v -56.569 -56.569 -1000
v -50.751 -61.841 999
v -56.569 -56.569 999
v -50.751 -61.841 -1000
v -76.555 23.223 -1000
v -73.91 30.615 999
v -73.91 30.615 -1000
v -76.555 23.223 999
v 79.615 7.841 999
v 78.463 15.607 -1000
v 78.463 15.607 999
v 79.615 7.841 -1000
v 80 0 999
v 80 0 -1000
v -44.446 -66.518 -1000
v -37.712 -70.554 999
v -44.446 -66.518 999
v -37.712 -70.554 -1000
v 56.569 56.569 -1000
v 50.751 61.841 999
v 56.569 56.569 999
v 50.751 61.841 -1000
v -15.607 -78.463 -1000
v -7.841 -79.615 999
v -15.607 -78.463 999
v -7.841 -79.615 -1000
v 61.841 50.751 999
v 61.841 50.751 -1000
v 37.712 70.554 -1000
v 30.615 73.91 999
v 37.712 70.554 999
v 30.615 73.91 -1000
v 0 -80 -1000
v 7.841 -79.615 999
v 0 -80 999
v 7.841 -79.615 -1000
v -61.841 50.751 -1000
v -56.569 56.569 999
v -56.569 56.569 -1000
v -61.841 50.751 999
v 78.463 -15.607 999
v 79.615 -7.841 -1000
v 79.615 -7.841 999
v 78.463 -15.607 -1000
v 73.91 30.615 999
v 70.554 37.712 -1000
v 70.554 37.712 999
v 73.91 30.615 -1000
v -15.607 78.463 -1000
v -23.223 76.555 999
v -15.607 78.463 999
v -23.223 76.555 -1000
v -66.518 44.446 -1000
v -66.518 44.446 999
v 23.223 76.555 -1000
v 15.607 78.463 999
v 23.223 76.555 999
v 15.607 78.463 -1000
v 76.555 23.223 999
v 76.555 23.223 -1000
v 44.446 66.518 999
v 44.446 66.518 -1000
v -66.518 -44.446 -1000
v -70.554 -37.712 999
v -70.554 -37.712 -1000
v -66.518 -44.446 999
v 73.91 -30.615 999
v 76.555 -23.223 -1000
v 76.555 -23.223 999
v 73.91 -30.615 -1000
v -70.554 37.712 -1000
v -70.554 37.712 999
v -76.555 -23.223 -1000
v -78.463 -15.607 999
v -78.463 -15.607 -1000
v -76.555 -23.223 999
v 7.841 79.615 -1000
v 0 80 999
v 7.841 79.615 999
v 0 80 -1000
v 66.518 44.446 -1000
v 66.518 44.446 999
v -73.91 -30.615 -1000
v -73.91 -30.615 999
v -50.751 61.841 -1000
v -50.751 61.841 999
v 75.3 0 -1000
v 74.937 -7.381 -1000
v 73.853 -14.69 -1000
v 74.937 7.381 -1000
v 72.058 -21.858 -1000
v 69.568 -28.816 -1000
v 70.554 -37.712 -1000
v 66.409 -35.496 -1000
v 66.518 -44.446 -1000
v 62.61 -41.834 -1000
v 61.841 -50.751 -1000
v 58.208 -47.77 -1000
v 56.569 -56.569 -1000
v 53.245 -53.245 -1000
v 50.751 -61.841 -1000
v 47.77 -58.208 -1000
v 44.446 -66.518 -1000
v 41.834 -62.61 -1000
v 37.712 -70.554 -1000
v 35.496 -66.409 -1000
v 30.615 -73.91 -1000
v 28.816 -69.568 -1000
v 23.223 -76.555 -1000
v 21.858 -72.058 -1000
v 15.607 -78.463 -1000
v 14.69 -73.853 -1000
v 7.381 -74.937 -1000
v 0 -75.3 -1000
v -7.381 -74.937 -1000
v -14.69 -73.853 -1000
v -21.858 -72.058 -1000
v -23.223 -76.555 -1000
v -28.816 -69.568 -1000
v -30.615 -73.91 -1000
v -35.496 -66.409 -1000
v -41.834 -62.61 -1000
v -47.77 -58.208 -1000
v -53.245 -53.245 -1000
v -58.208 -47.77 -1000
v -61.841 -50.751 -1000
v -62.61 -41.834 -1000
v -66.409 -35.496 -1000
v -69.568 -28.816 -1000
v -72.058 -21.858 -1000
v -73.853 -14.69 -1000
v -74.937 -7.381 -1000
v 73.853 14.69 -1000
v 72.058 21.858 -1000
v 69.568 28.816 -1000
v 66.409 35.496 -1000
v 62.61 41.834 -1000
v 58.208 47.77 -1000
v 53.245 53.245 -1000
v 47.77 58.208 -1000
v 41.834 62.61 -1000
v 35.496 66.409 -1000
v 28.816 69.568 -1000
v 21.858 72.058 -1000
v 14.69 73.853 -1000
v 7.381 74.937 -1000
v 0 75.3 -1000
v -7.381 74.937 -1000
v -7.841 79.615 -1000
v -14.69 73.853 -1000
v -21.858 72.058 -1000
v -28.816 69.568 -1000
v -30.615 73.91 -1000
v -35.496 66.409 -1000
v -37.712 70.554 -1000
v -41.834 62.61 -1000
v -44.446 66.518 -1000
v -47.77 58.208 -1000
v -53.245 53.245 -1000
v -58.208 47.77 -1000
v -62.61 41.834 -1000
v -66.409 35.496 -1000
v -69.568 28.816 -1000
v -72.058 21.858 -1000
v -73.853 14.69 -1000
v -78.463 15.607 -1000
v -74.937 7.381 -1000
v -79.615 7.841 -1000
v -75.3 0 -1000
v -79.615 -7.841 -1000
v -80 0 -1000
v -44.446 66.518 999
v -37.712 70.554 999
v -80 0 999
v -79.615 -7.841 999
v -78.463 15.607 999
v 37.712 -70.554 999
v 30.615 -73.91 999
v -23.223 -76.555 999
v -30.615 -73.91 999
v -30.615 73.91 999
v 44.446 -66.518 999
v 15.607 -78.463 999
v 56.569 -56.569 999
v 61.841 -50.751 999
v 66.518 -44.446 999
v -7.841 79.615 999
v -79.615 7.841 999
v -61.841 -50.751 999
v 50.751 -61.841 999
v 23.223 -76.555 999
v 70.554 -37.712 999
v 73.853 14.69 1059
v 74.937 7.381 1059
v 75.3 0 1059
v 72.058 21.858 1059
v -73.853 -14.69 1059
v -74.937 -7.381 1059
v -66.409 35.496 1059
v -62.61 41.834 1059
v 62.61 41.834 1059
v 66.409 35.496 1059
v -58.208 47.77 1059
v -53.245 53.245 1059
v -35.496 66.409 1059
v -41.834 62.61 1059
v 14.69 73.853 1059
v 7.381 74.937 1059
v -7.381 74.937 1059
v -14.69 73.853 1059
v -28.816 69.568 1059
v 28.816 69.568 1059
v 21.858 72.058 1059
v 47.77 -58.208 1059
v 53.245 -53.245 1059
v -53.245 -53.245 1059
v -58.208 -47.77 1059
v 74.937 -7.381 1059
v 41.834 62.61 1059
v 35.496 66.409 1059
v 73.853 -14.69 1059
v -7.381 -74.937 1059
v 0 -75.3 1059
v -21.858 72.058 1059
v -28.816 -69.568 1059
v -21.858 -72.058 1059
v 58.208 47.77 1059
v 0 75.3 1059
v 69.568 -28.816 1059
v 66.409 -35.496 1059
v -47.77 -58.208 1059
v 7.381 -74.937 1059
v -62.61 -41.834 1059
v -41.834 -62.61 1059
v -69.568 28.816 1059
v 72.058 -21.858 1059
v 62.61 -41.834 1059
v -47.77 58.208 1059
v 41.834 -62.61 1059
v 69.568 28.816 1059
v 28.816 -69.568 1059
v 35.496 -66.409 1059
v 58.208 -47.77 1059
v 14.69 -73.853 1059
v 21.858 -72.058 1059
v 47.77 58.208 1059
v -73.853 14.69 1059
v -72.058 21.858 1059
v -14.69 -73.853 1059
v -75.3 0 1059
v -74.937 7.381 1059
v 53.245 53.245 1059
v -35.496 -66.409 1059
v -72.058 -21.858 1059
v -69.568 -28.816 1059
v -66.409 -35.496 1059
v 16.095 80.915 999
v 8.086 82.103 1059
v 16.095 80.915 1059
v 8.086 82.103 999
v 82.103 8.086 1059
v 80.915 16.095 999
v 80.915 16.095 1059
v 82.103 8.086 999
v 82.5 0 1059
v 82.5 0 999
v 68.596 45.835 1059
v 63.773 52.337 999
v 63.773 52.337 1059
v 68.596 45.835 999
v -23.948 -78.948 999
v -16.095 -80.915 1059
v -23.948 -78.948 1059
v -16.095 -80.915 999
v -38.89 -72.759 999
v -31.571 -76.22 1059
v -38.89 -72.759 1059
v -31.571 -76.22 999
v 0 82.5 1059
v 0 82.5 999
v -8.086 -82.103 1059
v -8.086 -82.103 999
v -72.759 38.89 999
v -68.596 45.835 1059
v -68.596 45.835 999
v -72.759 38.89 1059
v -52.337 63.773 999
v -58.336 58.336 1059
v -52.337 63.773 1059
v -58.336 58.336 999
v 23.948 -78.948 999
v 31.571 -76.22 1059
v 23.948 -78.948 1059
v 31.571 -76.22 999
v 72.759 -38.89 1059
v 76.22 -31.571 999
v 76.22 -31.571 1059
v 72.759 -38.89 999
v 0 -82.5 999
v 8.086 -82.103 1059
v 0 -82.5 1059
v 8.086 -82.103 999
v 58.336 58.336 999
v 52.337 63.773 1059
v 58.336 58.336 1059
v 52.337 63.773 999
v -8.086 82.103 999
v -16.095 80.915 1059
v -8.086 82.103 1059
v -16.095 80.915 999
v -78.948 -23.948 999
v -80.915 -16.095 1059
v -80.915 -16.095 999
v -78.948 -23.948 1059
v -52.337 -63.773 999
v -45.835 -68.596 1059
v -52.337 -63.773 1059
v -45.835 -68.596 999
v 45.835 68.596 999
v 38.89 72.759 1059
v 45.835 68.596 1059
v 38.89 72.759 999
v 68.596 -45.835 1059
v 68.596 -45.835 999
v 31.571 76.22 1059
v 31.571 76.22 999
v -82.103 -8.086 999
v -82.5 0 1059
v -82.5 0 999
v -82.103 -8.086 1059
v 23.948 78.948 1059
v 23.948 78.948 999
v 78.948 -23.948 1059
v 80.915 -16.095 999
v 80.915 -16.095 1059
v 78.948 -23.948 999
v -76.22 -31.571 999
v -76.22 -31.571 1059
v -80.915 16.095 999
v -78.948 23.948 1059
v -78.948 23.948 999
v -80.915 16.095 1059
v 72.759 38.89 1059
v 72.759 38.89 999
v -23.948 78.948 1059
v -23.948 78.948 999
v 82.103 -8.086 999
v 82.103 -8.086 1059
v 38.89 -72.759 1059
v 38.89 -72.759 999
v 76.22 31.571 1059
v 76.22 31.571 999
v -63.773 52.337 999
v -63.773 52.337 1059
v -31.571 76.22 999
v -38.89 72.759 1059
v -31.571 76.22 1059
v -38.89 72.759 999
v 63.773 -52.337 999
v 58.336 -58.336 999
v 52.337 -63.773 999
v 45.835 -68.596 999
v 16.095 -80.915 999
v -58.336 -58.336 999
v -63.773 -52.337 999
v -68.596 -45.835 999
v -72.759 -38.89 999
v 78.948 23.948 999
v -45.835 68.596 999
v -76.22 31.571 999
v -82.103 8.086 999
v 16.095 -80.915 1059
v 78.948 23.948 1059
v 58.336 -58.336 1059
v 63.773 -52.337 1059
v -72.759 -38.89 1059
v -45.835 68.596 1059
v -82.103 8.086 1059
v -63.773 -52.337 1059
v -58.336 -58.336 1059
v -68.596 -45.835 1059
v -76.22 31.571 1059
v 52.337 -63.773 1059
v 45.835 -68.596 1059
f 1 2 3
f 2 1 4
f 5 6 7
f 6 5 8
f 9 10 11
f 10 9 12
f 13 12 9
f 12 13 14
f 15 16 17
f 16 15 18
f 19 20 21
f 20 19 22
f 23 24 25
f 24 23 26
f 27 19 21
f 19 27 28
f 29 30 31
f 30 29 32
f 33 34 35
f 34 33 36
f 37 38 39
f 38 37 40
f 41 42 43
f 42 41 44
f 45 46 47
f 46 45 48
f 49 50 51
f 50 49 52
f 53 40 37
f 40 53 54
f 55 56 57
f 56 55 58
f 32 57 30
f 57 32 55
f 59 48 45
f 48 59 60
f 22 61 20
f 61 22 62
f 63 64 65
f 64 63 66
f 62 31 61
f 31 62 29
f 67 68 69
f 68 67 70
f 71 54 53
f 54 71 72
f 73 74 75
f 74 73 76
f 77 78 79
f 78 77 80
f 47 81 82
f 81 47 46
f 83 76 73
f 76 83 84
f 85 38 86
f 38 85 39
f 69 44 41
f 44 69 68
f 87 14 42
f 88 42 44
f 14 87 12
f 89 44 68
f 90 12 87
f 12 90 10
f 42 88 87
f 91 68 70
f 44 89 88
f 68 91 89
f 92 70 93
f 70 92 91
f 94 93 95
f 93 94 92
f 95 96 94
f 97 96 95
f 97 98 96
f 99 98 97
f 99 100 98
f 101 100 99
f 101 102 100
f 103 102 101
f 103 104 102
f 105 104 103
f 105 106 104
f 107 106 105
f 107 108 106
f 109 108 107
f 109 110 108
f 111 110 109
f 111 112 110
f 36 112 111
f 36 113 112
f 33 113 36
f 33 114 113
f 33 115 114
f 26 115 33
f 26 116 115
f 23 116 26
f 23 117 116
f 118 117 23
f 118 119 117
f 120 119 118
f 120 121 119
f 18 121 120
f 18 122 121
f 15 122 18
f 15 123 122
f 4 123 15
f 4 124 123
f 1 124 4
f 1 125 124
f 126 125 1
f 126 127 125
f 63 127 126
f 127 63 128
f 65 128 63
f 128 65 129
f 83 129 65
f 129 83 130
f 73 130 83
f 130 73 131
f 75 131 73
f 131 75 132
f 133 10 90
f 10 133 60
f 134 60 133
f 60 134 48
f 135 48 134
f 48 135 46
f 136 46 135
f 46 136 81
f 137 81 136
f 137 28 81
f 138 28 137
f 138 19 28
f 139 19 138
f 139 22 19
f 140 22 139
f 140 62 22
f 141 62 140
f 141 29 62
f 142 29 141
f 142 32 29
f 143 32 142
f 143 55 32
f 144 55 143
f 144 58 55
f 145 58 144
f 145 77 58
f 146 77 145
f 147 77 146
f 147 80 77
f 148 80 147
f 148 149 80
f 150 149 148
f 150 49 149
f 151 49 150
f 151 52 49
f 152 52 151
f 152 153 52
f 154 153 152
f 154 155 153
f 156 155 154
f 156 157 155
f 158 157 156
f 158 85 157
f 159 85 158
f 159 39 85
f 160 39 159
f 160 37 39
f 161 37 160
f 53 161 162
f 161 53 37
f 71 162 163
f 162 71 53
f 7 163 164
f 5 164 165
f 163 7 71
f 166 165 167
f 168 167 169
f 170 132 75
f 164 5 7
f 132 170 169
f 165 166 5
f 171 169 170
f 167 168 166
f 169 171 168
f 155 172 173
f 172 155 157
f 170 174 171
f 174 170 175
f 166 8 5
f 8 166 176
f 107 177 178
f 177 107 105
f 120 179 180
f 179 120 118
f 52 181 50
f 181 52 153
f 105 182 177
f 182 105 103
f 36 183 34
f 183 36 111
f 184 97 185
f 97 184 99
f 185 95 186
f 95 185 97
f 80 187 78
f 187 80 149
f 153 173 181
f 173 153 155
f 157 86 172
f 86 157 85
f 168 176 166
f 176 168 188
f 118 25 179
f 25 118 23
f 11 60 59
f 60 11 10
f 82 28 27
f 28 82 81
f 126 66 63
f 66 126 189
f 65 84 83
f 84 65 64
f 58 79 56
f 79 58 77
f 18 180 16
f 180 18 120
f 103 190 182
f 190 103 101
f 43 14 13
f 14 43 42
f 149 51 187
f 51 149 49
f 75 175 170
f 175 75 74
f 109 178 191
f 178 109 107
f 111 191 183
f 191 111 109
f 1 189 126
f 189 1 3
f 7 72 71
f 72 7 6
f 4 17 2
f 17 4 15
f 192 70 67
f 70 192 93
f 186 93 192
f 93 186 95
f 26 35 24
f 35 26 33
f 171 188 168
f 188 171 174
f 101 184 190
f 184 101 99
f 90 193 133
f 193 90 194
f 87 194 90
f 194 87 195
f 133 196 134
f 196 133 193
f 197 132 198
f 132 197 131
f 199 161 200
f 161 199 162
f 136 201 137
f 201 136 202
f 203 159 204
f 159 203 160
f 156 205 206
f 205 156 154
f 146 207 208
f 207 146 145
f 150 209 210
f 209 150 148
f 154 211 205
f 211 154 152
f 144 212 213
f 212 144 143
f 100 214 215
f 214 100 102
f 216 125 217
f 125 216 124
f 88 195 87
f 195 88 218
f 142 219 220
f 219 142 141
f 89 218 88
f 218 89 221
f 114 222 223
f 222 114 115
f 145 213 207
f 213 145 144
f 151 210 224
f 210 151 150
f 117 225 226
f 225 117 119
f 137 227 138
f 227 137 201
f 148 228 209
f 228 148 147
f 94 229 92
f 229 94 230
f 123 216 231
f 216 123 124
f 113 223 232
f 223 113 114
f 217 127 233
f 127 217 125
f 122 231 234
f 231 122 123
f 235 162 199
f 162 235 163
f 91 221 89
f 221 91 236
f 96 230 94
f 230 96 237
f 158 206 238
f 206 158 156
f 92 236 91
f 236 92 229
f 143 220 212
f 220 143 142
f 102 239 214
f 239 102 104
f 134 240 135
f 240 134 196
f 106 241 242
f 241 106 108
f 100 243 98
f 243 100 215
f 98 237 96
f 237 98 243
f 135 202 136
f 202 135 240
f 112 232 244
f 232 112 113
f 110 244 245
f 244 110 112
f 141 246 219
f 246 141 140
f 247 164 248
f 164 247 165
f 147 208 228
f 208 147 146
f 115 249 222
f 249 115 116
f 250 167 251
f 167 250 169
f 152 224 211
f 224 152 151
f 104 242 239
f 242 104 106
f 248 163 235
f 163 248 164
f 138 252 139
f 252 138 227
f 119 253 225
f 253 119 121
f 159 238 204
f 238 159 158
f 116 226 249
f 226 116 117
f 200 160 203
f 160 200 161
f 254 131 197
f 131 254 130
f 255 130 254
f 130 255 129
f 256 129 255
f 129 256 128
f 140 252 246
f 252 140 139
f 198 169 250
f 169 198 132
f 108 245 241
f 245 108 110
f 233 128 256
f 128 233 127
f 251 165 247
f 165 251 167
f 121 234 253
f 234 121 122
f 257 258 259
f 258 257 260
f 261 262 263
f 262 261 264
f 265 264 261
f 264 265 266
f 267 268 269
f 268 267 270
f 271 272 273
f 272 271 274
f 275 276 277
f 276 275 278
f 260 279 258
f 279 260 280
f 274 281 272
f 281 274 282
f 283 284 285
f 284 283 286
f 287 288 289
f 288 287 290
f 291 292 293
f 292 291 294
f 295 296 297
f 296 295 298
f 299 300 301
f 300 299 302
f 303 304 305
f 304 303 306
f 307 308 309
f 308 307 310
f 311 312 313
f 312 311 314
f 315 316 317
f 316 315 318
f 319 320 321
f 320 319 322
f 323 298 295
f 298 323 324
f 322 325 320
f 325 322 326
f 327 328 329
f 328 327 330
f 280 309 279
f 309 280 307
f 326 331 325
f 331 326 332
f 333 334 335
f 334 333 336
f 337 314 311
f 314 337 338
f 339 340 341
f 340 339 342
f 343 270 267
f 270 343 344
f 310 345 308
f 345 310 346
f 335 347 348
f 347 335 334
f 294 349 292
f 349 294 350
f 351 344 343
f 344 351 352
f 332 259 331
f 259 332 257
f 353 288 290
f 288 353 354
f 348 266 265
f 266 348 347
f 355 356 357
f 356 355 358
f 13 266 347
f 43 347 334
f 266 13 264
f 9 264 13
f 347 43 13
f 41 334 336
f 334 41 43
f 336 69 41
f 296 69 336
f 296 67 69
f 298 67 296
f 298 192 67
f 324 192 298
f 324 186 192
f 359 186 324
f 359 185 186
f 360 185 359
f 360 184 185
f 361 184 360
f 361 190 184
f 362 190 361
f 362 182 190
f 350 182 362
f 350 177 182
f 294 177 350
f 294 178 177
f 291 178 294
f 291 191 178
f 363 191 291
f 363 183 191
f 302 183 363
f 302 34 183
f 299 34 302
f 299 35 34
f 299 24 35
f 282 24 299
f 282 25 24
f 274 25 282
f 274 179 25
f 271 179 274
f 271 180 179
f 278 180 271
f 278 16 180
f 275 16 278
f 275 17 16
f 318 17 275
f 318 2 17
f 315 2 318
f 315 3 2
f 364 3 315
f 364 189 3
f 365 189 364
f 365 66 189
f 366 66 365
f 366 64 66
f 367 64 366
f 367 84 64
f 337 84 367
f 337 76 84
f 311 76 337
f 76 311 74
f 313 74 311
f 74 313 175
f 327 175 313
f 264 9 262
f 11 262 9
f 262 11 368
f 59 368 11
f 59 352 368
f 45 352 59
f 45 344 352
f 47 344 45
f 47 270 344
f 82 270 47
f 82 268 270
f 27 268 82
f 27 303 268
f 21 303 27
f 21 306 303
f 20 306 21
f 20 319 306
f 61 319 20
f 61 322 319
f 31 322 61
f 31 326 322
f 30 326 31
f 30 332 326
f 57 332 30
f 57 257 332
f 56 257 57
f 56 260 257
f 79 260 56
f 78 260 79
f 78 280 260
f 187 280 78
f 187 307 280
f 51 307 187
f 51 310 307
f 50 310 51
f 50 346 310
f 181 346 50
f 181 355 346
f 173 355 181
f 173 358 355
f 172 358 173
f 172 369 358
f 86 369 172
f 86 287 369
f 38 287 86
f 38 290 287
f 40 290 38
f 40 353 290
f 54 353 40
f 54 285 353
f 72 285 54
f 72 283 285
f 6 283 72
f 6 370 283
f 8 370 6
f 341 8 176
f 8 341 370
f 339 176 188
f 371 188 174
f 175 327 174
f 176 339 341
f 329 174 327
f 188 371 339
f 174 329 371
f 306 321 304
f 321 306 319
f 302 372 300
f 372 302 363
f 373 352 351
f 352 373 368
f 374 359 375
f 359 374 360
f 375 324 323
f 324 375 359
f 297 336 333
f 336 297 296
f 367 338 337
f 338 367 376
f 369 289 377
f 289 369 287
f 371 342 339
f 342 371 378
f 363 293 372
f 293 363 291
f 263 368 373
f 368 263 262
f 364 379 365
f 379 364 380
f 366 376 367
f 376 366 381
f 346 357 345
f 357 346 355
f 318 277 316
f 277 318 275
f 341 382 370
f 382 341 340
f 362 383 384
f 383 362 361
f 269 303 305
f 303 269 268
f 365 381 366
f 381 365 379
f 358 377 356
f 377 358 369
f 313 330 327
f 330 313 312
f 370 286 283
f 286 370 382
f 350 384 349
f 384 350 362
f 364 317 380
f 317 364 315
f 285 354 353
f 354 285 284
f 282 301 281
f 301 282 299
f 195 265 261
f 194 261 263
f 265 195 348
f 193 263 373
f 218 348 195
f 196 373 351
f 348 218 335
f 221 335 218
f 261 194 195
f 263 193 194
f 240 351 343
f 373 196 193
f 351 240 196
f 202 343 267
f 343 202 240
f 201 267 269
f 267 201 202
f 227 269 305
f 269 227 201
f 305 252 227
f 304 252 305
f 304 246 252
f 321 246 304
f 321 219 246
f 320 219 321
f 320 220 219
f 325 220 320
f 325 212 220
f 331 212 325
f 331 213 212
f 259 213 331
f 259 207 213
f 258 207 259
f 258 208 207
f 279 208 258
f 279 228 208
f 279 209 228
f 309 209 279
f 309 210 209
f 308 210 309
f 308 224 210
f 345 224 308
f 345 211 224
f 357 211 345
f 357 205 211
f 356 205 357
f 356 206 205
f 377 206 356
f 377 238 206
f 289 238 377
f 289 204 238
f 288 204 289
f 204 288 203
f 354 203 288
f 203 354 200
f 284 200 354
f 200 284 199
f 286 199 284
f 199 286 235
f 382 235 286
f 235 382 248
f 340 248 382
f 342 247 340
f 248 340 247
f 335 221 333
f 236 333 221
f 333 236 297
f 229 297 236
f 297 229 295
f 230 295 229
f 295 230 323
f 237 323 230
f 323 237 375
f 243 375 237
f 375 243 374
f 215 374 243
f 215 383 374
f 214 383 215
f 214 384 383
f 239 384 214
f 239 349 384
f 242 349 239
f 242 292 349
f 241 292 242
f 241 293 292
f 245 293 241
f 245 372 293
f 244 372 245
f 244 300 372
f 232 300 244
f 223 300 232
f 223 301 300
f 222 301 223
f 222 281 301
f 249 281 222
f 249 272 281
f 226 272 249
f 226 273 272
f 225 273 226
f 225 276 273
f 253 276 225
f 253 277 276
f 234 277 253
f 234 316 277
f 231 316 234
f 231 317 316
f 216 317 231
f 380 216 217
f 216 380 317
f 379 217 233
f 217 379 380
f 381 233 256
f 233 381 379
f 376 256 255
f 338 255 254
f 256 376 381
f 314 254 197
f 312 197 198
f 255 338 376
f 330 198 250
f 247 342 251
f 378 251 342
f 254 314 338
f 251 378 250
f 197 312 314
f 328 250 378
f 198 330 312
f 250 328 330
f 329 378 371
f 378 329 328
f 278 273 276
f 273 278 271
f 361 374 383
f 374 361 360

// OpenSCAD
// Parameters
nominal_diameter_mm = 160; //[80:320:1]
length_mm = 2000; //[1000:4000:10]
wall_thickness_mm = 4.7; //[2.5:9.5:0.1]
include_end_fitting = 1; //[0:1:1]
fitting_length_mm = 60; //[30:120:1]
fitting_wall_extra_mm = 2.5; //[1:6:0.1]
connection_overlap_mm = 1; //[0.5:2:0.1]

// HT Pipe - complete geometry
module ht_pipe() {
  color([0.85, 0.85, 0.8]) { // PVC color
    difference() {
      // Outer cylinder of the pipe
      cylinder(r=nominal_diameter_mm/2, h=length_mm, center=true, $fn=64);
      // Inner cylinder of the pipe
      cylinder(r=nominal_diameter_mm/2 - wall_thickness_mm, h=length_mm + 2*connection_overlap_mm, center=true, $fn=64);
    }
  }
}

// End fitting - complete geometry
module end_fitting() {
  if (include_end_fitting) {
    color([0.85, 0.85, 0.8]) { // PVC color
      difference() {
        // Outer cylinder of the end fitting
        translate([0, 0, length_mm/2 + fitting_length_mm/2 - connection_overlap_mm])
          cylinder(r=nominal_diameter_mm/2 + fitting_wall_extra_mm, h=fitting_length_mm, center=true, $fn=64);
        // Inner cylinder of the end fitting
        translate([0, 0, length_mm/2 + fitting_length_mm/2 - connection_overlap_mm])
          cylinder(r=nominal_diameter_mm/2 - wall_thickness_mm, h=fitting_length_mm + 2*connection_overlap_mm, center=true, $fn=64);
      }
    }
  }
}

// Assembly
module assembly() {
  union() {
    ht_pipe();
    end_fitting();
  }
}

assembly();
